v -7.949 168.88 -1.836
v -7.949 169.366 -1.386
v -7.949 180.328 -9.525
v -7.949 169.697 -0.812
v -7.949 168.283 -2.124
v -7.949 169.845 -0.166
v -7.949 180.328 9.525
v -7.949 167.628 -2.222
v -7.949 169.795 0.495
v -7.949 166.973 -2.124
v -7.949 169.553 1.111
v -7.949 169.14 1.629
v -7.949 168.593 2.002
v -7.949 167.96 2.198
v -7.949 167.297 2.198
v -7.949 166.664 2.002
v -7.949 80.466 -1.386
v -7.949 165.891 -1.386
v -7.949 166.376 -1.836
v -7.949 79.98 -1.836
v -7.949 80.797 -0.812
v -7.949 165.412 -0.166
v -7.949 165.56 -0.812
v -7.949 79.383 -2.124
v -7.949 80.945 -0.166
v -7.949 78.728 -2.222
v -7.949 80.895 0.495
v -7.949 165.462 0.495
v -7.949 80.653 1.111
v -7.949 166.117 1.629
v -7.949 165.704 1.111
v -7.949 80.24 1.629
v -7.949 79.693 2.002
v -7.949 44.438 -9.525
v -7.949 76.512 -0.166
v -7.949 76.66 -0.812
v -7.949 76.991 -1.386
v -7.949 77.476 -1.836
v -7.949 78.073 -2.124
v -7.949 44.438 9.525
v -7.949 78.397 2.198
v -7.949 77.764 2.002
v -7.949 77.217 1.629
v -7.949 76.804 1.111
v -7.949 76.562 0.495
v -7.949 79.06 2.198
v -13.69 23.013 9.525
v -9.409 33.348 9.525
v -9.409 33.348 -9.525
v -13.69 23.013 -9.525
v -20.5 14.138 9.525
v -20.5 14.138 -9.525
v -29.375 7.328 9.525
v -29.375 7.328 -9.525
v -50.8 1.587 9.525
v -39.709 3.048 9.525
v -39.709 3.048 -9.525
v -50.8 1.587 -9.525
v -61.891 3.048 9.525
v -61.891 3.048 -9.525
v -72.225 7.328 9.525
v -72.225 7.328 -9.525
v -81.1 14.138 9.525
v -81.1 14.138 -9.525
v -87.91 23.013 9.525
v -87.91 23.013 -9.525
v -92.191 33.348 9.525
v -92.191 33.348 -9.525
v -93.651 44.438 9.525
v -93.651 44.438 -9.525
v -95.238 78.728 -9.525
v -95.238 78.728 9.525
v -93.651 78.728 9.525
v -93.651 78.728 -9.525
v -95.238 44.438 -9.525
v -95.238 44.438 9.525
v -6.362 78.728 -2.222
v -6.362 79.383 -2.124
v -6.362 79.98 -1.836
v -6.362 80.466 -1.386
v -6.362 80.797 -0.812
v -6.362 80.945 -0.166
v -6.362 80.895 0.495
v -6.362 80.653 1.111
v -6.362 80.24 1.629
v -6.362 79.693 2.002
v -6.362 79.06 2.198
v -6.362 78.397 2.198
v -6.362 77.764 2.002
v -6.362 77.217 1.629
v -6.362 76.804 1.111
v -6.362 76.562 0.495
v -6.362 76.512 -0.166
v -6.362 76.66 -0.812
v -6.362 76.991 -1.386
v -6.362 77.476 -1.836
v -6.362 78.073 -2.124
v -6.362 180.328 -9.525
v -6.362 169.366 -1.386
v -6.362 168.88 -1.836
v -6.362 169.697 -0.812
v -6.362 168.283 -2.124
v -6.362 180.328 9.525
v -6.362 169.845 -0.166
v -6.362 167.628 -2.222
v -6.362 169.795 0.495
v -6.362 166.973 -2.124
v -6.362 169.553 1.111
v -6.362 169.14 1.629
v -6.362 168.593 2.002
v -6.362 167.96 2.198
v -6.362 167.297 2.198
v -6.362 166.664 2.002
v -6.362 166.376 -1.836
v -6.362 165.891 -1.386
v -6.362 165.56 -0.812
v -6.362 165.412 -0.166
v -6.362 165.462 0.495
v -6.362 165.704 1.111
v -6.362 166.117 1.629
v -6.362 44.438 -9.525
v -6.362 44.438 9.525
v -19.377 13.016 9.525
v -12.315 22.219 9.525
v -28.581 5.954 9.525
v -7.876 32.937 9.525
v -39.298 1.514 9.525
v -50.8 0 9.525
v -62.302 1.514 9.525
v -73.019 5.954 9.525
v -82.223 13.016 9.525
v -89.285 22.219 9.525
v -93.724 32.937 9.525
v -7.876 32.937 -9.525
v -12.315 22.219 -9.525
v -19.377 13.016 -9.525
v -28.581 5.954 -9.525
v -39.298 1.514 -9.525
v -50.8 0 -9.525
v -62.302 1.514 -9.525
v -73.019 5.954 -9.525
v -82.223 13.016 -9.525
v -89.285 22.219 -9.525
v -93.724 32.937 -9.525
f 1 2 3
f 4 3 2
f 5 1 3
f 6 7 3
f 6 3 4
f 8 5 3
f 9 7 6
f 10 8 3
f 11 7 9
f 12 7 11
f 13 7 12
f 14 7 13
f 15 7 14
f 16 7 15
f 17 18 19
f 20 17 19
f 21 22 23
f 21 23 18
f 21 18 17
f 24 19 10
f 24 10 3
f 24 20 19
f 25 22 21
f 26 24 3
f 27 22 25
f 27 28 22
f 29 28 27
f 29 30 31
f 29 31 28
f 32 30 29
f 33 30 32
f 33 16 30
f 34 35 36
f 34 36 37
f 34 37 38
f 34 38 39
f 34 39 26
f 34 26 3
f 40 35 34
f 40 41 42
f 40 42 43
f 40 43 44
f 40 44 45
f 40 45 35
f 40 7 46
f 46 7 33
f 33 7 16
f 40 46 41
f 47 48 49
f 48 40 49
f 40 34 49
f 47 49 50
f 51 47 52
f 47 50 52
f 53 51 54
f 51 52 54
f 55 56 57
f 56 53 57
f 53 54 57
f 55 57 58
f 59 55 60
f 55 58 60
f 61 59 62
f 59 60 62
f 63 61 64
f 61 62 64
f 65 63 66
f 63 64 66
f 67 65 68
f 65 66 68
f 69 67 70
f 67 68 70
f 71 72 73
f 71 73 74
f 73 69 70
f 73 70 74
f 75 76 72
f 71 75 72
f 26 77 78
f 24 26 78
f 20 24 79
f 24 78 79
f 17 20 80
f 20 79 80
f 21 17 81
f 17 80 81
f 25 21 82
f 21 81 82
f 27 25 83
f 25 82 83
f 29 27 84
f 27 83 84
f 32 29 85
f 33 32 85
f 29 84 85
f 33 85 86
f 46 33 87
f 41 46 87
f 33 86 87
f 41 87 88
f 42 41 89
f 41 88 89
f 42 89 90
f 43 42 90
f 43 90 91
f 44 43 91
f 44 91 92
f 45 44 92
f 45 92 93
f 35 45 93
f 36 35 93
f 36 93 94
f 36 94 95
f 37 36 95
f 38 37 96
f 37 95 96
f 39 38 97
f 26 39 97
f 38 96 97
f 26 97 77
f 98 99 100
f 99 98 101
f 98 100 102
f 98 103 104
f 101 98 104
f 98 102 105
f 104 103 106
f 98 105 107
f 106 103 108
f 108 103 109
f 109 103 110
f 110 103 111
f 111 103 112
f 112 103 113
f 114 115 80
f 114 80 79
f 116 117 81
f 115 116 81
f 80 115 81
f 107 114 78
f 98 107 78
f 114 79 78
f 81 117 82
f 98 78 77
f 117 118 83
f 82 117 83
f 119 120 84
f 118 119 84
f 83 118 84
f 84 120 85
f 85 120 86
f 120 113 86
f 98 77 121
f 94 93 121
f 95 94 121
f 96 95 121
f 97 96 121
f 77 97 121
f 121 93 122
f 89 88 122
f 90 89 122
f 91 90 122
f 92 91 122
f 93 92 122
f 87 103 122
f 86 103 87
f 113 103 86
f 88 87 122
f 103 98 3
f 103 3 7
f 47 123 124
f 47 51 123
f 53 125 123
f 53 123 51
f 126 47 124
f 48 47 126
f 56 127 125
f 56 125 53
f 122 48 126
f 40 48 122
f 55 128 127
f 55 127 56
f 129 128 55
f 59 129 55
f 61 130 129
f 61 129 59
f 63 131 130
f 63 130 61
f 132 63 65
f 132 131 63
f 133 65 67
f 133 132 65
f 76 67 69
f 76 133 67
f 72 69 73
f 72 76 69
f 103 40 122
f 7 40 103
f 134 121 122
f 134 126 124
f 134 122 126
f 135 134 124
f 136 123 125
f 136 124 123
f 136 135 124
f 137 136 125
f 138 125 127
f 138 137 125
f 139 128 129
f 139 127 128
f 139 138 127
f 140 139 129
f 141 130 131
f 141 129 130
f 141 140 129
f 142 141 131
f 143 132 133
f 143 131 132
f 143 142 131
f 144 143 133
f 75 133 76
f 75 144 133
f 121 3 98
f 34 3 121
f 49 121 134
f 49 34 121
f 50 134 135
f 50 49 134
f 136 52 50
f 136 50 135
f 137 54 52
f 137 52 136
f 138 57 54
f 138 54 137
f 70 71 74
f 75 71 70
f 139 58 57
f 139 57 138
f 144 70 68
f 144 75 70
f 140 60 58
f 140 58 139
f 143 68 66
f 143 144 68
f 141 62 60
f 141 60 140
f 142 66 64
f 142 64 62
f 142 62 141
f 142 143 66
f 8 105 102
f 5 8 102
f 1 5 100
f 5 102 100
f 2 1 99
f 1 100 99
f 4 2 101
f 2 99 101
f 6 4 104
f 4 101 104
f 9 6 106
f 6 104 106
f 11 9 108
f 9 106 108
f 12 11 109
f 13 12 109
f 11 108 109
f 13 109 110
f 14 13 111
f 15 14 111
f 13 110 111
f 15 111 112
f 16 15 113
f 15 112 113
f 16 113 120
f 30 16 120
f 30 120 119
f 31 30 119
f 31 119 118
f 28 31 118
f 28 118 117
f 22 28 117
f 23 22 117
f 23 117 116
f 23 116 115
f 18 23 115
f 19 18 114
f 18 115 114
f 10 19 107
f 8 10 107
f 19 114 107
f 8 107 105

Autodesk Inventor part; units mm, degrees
ref_plane "YZ Plane" through (0, 0, 0) normal (1, 0, 0) x (0, 1, 0)
ref_plane "XZ Plane" through (0, 0, 0) normal (0, 1, 0) x (-1, 0, 0)
ref_plane "XY Plane" through (0, 0, 0) normal (0, 0, 1) x (1, 0, 0)
sketch "Sketch1" plane through (0, 0, 0) normal (0, 1, 0) x (-1, 0, 0)
  line L0 (152.4, -9.525) -> (-152.4, -9.525)
  line L1 (-152.4, -9.525) -> (-152.4, 9.525)
  line L2 (-152.4, 9.525) -> (152.4, 9.525)
  line L3 (152.4, 9.525) -> (152.4, -9.525)
  line L4 (152.4, -9.525) -> (-152.4, 9.525) construction
  line L5 (-152.4, -9.525) -> (152.4, 9.525) construction
  point P0 (0, 0)
  dimension "d0" = 19.05
  dimension "d1" = 304.8
extrude "Extrusion1" add sketch "Sketch1" along normal blind 1.5875
sketch "Sketch2" plane through (0, 1.5875, 0) normal (0, 1, 0) x (1, 0, 0)
  line L0 (152.4, -9.525) -> (152.4, 9.525) projected
  line L1 (50.8, 36.3839) -> (50.8, -48.8029) construction
  line L2 (-50.8, 37.7294) -> (-50.8, -44.9073)
  line L3 (152.4, 9.525) -> (-152.4, 9.525) projected
  line L4 (-152.4, 9.525) -> (-152.4, -9.525) projected
  line L5 (-152.4, -9.525) -> (152.4, -9.525) projected
  line L6 (152.4, -9.525) -> (152.4, 9.525) projected
  line L7 (-152.4, 9.525) -> (50.8, -9.525) construction
  line L8 (50.8, 9.525) -> (-152.4, -9.525) construction
  point P0 (0, 0)
  point P1 (-50.8, 0)
  dimension "d4" = 101.6
bend part "Bend Part2" radius 42.8509 angle 180 line through (-50.8, 1.5875, -37.7294) along (0, 0, 1) centre toward (0, 1, 0) moving side (1, 0, 0) both sides yes
sketch "Sketch3" plane through (-6.3616, 44.4384, -9.525) normal (1, 0, 0) x (0, 0, -1)
  line L0 (-19.05, 0) -> (0, 0) projected
  line L1 (0, 135.89) -> (-19.05, 135.89) projected
  line L2 (-19.05, 135.89) -> (-19.05, 0) projected
  circle A0 centre (-9.525, 123.19) radius 2.2225
  line L3 (-19.05, 0) -> (0, 135.89) construction
  line L4 (-19.05, 135.89) -> (0, 0) construction
  line L5 (-9.525, 0) -> (-9.525, 135.89) construction
  circle A1 centre (-9.525, 34.29) radius 2.2225
  point P0 (-9.525, -44.4384)
  dimension "d9" = 4.445
  dimension "d10" = 12.7
  dimension "d13" = 88.9
extrude "Extrusion2" cut sketch "Sketch3" against normal blind 1.5875
properties part number "side guard" material "Polycarbonate, Clear"
